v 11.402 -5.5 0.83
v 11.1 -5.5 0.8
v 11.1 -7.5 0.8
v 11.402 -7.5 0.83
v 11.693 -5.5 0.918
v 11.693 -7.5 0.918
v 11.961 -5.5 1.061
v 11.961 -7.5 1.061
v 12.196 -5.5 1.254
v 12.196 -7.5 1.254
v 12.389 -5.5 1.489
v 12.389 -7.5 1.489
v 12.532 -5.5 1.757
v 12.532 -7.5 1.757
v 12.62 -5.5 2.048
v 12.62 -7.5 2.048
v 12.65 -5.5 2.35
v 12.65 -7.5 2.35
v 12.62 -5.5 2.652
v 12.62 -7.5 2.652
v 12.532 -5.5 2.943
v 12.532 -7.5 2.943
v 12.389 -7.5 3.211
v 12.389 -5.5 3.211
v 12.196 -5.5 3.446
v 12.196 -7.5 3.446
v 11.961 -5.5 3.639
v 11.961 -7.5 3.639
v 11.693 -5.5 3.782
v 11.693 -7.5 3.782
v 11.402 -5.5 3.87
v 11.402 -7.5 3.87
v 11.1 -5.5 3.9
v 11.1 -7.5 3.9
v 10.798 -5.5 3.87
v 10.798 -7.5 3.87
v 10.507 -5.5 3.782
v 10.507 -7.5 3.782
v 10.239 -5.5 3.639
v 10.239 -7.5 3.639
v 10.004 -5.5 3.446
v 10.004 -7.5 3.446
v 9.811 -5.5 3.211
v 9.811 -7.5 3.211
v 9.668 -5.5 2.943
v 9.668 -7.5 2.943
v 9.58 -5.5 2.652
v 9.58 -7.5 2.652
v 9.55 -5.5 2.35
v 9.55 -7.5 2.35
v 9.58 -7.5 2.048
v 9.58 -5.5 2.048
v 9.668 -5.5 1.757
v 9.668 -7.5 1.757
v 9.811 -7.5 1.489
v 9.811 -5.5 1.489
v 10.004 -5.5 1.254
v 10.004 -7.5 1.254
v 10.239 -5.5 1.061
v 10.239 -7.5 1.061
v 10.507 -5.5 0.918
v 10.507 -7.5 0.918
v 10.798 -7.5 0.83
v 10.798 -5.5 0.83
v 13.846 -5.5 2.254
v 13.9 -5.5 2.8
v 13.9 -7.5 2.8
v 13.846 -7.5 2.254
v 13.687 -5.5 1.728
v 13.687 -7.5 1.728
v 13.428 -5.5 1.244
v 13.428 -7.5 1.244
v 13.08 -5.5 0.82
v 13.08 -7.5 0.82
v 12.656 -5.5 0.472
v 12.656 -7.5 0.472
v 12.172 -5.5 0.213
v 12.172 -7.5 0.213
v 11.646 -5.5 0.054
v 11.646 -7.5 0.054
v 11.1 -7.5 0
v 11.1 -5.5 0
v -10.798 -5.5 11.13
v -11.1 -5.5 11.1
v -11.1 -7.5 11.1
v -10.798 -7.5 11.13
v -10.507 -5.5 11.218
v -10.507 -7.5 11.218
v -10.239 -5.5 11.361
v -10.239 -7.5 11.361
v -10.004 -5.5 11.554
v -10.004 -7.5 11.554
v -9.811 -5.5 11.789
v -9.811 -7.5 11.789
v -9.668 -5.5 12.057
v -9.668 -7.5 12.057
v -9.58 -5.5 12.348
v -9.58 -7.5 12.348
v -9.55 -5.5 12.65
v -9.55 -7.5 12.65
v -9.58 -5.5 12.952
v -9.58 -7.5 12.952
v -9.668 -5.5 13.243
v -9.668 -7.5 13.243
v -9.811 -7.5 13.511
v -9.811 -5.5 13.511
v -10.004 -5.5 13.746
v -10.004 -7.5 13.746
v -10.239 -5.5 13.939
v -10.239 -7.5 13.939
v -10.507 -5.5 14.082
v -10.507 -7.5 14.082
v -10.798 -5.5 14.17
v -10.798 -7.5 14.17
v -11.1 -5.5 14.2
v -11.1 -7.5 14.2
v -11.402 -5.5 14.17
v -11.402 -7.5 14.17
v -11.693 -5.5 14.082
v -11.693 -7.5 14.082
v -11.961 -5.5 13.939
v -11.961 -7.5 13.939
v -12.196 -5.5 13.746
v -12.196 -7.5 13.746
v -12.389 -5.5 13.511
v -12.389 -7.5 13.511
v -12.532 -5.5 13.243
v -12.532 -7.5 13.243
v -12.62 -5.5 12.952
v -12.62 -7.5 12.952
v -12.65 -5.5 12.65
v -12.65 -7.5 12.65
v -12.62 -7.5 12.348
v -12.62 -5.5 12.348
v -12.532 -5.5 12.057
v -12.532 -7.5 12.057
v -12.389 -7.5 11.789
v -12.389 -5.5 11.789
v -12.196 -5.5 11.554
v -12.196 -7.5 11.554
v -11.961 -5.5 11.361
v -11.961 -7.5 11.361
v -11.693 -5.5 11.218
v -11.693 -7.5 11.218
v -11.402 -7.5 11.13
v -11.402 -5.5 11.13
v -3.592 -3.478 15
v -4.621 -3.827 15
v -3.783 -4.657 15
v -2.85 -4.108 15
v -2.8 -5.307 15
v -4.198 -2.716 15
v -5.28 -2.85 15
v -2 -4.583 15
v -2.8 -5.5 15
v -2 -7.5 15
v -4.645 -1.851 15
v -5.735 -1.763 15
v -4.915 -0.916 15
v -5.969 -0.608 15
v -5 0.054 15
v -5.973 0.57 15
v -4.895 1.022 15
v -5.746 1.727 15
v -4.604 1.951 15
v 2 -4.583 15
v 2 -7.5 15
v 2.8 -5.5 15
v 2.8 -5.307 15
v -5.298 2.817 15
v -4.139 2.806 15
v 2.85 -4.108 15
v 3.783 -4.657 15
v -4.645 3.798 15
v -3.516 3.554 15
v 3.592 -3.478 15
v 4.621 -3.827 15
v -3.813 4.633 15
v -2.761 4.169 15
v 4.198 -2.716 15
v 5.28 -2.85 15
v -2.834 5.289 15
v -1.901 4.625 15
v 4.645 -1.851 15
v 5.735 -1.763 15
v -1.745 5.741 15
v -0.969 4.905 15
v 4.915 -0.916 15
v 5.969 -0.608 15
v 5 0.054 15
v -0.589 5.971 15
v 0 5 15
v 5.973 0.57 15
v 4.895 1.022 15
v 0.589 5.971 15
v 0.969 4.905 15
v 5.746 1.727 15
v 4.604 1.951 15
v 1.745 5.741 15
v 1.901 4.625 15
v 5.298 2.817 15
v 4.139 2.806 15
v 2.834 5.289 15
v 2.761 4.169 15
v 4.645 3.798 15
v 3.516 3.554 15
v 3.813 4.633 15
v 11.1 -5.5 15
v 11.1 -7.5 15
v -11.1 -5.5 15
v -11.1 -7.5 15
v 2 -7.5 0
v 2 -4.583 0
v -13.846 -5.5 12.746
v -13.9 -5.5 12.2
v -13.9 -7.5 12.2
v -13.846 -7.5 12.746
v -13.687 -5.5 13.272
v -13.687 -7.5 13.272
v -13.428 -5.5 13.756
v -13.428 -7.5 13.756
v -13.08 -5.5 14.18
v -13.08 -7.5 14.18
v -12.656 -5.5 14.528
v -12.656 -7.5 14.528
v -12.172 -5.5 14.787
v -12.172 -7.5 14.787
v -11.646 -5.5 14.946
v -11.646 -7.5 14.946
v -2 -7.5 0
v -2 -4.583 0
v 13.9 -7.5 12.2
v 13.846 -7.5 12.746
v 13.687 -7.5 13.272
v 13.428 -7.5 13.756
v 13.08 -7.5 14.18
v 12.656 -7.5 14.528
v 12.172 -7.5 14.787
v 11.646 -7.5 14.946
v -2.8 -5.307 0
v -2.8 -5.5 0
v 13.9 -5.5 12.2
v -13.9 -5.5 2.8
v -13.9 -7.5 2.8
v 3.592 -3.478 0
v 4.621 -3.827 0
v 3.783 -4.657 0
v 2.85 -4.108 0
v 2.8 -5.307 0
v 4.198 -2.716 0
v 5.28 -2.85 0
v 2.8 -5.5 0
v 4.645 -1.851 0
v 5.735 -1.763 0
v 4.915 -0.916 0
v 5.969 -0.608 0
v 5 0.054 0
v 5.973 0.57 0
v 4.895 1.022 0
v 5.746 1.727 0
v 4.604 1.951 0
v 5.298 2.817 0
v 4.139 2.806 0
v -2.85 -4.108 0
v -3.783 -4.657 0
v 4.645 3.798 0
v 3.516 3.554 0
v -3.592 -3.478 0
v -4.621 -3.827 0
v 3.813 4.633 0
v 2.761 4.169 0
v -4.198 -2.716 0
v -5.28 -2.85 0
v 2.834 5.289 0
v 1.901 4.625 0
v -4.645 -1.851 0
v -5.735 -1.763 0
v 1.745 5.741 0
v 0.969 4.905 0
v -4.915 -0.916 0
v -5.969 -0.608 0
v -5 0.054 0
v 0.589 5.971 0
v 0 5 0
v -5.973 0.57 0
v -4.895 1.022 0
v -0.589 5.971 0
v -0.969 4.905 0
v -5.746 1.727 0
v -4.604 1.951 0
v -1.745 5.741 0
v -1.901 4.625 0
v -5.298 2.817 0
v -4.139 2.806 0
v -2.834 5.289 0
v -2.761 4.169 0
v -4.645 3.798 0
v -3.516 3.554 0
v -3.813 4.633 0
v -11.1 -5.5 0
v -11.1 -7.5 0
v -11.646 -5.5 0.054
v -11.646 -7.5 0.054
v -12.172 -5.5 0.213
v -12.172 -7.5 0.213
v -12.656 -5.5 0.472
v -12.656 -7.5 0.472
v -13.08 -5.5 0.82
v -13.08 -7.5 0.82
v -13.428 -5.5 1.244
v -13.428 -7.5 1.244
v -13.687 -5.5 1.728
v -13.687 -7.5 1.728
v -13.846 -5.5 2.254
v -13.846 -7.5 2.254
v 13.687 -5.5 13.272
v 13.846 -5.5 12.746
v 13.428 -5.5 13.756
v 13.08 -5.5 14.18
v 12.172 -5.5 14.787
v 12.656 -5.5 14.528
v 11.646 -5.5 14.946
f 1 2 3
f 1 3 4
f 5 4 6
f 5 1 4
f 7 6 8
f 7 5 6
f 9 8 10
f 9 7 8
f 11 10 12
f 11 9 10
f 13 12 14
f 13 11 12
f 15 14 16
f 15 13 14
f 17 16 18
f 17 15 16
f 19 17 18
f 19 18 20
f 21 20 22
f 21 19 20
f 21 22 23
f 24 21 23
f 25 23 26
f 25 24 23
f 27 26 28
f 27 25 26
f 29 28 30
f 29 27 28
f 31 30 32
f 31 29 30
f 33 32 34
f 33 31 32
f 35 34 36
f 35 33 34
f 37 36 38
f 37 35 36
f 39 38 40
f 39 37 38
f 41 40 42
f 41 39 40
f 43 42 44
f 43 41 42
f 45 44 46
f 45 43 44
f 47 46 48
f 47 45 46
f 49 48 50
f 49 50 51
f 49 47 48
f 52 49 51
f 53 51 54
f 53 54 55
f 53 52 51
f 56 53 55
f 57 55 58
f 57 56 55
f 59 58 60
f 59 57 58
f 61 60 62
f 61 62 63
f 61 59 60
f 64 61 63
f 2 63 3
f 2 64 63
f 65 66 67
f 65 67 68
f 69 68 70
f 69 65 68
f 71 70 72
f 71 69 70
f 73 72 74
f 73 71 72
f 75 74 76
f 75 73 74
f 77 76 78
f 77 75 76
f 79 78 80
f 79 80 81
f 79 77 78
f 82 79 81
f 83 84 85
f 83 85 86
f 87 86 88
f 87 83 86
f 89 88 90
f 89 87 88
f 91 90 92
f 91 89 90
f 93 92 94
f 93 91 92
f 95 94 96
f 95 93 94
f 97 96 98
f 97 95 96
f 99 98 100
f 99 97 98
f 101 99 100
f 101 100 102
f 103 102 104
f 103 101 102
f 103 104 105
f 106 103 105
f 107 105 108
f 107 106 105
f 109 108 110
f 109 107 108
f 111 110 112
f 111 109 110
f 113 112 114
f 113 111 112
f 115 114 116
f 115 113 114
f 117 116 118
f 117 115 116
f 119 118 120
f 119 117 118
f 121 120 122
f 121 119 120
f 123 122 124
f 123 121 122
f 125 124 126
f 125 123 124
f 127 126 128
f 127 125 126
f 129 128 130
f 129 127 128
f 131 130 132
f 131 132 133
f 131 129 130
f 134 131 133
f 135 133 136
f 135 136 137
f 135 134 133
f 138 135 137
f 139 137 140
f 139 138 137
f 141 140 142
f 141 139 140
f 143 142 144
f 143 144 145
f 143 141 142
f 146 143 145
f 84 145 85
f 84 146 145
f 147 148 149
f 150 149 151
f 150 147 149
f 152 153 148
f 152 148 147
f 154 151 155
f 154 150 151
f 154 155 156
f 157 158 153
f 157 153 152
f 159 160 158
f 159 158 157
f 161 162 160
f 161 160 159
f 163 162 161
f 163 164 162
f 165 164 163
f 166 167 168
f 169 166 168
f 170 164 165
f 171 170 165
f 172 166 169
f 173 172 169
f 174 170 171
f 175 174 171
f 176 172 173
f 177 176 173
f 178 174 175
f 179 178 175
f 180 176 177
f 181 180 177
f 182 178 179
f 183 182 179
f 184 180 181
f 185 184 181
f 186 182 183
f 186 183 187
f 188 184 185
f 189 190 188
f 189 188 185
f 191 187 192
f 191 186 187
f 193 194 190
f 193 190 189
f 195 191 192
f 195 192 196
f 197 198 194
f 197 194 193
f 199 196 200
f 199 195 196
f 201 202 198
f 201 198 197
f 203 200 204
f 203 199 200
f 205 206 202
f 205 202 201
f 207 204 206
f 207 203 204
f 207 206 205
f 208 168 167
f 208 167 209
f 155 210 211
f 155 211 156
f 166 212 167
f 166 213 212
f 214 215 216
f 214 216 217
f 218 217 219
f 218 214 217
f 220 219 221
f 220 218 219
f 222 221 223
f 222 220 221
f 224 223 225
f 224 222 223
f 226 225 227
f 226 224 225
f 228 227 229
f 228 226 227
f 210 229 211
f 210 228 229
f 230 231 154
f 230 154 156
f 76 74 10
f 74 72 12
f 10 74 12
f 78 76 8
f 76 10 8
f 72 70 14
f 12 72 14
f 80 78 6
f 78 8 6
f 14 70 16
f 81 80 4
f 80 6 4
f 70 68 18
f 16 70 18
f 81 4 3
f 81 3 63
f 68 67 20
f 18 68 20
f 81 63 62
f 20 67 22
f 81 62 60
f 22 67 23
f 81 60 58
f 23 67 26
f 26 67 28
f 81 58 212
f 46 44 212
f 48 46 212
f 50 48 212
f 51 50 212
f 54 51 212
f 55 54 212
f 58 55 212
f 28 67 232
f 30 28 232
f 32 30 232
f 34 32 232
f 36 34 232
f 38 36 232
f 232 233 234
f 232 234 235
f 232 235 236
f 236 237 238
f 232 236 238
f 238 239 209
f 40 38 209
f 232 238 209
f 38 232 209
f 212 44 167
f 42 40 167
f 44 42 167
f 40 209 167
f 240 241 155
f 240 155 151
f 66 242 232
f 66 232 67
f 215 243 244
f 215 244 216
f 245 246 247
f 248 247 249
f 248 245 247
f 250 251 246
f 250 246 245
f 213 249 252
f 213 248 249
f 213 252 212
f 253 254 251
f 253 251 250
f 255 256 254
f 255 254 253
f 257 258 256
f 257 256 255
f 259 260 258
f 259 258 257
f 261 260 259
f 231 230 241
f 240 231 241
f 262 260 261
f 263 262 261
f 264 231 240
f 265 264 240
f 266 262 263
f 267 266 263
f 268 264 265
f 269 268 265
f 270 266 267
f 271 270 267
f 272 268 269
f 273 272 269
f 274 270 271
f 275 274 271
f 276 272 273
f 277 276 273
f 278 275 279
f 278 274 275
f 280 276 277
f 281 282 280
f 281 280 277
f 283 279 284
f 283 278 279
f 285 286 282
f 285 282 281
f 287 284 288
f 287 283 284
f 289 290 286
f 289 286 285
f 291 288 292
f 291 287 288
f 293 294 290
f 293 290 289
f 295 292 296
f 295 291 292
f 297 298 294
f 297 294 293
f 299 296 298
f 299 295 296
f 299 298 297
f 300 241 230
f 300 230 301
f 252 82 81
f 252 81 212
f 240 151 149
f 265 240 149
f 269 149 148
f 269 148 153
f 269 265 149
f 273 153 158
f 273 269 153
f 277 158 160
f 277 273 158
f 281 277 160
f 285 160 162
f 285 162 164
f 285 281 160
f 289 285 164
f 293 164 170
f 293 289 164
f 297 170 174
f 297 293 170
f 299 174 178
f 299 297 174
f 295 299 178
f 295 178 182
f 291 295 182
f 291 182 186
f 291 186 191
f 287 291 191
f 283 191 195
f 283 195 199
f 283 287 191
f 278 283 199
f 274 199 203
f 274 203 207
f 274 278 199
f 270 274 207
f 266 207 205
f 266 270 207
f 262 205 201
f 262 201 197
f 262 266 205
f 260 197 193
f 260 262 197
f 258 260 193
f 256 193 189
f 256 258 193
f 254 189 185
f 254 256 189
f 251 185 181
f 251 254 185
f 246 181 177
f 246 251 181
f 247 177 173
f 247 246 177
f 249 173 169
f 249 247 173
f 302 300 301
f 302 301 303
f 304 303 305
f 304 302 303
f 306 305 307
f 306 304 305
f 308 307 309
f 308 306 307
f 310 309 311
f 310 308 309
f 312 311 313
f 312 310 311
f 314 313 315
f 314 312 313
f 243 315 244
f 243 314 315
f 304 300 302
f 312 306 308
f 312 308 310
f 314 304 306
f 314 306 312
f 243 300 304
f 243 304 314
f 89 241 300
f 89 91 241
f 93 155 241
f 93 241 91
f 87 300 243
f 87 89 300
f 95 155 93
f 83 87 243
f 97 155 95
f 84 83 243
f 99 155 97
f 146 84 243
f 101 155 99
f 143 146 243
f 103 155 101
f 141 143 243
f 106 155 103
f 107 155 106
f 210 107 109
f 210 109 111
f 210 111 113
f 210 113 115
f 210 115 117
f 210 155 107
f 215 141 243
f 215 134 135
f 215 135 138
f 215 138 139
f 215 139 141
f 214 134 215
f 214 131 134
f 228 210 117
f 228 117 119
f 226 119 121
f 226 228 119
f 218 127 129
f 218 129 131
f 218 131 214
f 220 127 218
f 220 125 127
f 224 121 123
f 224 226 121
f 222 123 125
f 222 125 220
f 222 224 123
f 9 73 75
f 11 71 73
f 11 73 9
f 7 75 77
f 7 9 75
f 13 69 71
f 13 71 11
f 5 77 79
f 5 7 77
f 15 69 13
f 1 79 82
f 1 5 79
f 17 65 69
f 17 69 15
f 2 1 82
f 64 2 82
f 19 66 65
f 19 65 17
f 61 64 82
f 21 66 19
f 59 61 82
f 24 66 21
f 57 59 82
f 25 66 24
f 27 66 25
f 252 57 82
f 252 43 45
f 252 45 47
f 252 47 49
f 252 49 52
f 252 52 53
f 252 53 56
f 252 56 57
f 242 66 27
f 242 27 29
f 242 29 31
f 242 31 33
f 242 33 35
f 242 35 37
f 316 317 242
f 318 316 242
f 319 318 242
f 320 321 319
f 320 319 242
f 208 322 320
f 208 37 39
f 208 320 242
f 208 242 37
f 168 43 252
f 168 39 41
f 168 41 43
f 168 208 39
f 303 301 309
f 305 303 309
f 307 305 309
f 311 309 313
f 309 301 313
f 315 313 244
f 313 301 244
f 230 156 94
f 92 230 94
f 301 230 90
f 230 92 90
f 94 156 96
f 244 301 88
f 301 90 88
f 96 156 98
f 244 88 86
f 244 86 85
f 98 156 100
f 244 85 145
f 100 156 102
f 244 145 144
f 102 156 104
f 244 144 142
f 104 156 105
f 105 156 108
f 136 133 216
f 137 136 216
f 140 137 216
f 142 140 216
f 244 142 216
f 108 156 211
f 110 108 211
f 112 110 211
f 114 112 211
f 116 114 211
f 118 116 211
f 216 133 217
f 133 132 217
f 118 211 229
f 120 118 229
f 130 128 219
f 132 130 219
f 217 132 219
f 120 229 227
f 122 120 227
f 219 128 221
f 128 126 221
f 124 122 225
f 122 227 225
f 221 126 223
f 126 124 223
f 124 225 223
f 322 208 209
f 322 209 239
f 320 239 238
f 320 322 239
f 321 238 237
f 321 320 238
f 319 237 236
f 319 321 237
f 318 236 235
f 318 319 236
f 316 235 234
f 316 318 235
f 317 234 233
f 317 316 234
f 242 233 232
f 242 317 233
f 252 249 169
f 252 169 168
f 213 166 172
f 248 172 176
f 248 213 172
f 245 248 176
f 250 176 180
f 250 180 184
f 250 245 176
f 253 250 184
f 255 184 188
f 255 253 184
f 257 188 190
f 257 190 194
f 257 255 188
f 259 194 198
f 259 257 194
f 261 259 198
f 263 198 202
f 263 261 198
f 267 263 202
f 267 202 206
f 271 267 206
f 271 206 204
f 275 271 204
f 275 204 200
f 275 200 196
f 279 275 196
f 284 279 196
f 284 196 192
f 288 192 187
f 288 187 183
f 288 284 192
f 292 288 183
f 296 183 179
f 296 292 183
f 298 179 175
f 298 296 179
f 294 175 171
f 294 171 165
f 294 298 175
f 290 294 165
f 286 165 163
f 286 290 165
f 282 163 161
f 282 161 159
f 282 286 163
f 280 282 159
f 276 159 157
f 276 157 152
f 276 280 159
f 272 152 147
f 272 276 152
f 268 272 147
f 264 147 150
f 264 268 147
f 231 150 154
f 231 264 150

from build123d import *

# Parameters (mm, degrees)
SALIENTE_EXTRUIR2_DEPTH = 15
CROQUIS3_R              = 1.55
SALIENTE_EXTRUIR3_DEPTH = 2


with BuildPart() as part:
    # Croquis2 → Saliente-Extruir2 (new body)
    with BuildSketch(Plane.XY):
        with BuildLine():
            Line((2.8, -5.306599665), (2.8, -5.5))
            Line((2.8, -5.5), (2, -5.5))
            Line((2, -5.5), (2, -4.582575695))
            ThreePointArc((2, -4.582575695), (0, 5), (-2, -4.582575695))
            Line((-2, -4.582575695), (-2, -5.5))
            Line((-2, -5.5), (-2.8, -5.5))
            Line((-2.8, -5.5), (-2.8, -5.306599665))
            ThreePointArc((-2.8, -5.306599665), (0, 6), (2.8, -5.306599665))
        make_face()
    extrude(amount=SALIENTE_EXTRUIR2_DEPTH)

    # Croquis3 → Saliente-Extruir3 (add)
    # profile 1 of 2: a face of its own
    with BuildSketch(Plane.XZ.offset(5.5)):
        with BuildLine():
            Line((2, 0), (2, 15))
            Line((2, 15), (11.1, 15))
            ThreePointArc((11.1, 15), (13.079898987, 14.179898987), (13.9, 12.2))
            Line((13.9, 12.2), (13.9, 2.8))
            ThreePointArc((13.9, 2.8), (13.079898987, 0.820101013), (11.1, 0))
            Line((11.1, 0), (2, 0))
        make_face()
        with Locations(Location((11.1, 2.35, 0), (0, 0, 270))):
            Circle(CROQUIS3_R, mode=Mode.SUBTRACT)
    # profile 2 of 2: a face of its own
    with BuildSketch(Plane.XZ.offset(5.5)):
        with BuildLine():
            Line((-13.9, 2.8), (-13.9, 12.2))
            ThreePointArc((-13.9, 12.2), (-13.079898987, 14.179898987), (-11.1, 15))
            Line((-11.1, 15), (-2, 15))
            Line((-2, 15), (-2, 0))
            Line((-2, 0), (-11.1, 0))
            ThreePointArc((-11.1, 0), (-13.079898987, 0.820101013), (-13.9, 2.8))
        make_face()
        with Locations(Location((-11.1, 12.65, 0), (0, 0, 270))):
            Circle(CROQUIS3_R, mode=Mode.SUBTRACT)
    extrude(amount=SALIENTE_EXTRUIR3_DEPTH)


solid = part.part
